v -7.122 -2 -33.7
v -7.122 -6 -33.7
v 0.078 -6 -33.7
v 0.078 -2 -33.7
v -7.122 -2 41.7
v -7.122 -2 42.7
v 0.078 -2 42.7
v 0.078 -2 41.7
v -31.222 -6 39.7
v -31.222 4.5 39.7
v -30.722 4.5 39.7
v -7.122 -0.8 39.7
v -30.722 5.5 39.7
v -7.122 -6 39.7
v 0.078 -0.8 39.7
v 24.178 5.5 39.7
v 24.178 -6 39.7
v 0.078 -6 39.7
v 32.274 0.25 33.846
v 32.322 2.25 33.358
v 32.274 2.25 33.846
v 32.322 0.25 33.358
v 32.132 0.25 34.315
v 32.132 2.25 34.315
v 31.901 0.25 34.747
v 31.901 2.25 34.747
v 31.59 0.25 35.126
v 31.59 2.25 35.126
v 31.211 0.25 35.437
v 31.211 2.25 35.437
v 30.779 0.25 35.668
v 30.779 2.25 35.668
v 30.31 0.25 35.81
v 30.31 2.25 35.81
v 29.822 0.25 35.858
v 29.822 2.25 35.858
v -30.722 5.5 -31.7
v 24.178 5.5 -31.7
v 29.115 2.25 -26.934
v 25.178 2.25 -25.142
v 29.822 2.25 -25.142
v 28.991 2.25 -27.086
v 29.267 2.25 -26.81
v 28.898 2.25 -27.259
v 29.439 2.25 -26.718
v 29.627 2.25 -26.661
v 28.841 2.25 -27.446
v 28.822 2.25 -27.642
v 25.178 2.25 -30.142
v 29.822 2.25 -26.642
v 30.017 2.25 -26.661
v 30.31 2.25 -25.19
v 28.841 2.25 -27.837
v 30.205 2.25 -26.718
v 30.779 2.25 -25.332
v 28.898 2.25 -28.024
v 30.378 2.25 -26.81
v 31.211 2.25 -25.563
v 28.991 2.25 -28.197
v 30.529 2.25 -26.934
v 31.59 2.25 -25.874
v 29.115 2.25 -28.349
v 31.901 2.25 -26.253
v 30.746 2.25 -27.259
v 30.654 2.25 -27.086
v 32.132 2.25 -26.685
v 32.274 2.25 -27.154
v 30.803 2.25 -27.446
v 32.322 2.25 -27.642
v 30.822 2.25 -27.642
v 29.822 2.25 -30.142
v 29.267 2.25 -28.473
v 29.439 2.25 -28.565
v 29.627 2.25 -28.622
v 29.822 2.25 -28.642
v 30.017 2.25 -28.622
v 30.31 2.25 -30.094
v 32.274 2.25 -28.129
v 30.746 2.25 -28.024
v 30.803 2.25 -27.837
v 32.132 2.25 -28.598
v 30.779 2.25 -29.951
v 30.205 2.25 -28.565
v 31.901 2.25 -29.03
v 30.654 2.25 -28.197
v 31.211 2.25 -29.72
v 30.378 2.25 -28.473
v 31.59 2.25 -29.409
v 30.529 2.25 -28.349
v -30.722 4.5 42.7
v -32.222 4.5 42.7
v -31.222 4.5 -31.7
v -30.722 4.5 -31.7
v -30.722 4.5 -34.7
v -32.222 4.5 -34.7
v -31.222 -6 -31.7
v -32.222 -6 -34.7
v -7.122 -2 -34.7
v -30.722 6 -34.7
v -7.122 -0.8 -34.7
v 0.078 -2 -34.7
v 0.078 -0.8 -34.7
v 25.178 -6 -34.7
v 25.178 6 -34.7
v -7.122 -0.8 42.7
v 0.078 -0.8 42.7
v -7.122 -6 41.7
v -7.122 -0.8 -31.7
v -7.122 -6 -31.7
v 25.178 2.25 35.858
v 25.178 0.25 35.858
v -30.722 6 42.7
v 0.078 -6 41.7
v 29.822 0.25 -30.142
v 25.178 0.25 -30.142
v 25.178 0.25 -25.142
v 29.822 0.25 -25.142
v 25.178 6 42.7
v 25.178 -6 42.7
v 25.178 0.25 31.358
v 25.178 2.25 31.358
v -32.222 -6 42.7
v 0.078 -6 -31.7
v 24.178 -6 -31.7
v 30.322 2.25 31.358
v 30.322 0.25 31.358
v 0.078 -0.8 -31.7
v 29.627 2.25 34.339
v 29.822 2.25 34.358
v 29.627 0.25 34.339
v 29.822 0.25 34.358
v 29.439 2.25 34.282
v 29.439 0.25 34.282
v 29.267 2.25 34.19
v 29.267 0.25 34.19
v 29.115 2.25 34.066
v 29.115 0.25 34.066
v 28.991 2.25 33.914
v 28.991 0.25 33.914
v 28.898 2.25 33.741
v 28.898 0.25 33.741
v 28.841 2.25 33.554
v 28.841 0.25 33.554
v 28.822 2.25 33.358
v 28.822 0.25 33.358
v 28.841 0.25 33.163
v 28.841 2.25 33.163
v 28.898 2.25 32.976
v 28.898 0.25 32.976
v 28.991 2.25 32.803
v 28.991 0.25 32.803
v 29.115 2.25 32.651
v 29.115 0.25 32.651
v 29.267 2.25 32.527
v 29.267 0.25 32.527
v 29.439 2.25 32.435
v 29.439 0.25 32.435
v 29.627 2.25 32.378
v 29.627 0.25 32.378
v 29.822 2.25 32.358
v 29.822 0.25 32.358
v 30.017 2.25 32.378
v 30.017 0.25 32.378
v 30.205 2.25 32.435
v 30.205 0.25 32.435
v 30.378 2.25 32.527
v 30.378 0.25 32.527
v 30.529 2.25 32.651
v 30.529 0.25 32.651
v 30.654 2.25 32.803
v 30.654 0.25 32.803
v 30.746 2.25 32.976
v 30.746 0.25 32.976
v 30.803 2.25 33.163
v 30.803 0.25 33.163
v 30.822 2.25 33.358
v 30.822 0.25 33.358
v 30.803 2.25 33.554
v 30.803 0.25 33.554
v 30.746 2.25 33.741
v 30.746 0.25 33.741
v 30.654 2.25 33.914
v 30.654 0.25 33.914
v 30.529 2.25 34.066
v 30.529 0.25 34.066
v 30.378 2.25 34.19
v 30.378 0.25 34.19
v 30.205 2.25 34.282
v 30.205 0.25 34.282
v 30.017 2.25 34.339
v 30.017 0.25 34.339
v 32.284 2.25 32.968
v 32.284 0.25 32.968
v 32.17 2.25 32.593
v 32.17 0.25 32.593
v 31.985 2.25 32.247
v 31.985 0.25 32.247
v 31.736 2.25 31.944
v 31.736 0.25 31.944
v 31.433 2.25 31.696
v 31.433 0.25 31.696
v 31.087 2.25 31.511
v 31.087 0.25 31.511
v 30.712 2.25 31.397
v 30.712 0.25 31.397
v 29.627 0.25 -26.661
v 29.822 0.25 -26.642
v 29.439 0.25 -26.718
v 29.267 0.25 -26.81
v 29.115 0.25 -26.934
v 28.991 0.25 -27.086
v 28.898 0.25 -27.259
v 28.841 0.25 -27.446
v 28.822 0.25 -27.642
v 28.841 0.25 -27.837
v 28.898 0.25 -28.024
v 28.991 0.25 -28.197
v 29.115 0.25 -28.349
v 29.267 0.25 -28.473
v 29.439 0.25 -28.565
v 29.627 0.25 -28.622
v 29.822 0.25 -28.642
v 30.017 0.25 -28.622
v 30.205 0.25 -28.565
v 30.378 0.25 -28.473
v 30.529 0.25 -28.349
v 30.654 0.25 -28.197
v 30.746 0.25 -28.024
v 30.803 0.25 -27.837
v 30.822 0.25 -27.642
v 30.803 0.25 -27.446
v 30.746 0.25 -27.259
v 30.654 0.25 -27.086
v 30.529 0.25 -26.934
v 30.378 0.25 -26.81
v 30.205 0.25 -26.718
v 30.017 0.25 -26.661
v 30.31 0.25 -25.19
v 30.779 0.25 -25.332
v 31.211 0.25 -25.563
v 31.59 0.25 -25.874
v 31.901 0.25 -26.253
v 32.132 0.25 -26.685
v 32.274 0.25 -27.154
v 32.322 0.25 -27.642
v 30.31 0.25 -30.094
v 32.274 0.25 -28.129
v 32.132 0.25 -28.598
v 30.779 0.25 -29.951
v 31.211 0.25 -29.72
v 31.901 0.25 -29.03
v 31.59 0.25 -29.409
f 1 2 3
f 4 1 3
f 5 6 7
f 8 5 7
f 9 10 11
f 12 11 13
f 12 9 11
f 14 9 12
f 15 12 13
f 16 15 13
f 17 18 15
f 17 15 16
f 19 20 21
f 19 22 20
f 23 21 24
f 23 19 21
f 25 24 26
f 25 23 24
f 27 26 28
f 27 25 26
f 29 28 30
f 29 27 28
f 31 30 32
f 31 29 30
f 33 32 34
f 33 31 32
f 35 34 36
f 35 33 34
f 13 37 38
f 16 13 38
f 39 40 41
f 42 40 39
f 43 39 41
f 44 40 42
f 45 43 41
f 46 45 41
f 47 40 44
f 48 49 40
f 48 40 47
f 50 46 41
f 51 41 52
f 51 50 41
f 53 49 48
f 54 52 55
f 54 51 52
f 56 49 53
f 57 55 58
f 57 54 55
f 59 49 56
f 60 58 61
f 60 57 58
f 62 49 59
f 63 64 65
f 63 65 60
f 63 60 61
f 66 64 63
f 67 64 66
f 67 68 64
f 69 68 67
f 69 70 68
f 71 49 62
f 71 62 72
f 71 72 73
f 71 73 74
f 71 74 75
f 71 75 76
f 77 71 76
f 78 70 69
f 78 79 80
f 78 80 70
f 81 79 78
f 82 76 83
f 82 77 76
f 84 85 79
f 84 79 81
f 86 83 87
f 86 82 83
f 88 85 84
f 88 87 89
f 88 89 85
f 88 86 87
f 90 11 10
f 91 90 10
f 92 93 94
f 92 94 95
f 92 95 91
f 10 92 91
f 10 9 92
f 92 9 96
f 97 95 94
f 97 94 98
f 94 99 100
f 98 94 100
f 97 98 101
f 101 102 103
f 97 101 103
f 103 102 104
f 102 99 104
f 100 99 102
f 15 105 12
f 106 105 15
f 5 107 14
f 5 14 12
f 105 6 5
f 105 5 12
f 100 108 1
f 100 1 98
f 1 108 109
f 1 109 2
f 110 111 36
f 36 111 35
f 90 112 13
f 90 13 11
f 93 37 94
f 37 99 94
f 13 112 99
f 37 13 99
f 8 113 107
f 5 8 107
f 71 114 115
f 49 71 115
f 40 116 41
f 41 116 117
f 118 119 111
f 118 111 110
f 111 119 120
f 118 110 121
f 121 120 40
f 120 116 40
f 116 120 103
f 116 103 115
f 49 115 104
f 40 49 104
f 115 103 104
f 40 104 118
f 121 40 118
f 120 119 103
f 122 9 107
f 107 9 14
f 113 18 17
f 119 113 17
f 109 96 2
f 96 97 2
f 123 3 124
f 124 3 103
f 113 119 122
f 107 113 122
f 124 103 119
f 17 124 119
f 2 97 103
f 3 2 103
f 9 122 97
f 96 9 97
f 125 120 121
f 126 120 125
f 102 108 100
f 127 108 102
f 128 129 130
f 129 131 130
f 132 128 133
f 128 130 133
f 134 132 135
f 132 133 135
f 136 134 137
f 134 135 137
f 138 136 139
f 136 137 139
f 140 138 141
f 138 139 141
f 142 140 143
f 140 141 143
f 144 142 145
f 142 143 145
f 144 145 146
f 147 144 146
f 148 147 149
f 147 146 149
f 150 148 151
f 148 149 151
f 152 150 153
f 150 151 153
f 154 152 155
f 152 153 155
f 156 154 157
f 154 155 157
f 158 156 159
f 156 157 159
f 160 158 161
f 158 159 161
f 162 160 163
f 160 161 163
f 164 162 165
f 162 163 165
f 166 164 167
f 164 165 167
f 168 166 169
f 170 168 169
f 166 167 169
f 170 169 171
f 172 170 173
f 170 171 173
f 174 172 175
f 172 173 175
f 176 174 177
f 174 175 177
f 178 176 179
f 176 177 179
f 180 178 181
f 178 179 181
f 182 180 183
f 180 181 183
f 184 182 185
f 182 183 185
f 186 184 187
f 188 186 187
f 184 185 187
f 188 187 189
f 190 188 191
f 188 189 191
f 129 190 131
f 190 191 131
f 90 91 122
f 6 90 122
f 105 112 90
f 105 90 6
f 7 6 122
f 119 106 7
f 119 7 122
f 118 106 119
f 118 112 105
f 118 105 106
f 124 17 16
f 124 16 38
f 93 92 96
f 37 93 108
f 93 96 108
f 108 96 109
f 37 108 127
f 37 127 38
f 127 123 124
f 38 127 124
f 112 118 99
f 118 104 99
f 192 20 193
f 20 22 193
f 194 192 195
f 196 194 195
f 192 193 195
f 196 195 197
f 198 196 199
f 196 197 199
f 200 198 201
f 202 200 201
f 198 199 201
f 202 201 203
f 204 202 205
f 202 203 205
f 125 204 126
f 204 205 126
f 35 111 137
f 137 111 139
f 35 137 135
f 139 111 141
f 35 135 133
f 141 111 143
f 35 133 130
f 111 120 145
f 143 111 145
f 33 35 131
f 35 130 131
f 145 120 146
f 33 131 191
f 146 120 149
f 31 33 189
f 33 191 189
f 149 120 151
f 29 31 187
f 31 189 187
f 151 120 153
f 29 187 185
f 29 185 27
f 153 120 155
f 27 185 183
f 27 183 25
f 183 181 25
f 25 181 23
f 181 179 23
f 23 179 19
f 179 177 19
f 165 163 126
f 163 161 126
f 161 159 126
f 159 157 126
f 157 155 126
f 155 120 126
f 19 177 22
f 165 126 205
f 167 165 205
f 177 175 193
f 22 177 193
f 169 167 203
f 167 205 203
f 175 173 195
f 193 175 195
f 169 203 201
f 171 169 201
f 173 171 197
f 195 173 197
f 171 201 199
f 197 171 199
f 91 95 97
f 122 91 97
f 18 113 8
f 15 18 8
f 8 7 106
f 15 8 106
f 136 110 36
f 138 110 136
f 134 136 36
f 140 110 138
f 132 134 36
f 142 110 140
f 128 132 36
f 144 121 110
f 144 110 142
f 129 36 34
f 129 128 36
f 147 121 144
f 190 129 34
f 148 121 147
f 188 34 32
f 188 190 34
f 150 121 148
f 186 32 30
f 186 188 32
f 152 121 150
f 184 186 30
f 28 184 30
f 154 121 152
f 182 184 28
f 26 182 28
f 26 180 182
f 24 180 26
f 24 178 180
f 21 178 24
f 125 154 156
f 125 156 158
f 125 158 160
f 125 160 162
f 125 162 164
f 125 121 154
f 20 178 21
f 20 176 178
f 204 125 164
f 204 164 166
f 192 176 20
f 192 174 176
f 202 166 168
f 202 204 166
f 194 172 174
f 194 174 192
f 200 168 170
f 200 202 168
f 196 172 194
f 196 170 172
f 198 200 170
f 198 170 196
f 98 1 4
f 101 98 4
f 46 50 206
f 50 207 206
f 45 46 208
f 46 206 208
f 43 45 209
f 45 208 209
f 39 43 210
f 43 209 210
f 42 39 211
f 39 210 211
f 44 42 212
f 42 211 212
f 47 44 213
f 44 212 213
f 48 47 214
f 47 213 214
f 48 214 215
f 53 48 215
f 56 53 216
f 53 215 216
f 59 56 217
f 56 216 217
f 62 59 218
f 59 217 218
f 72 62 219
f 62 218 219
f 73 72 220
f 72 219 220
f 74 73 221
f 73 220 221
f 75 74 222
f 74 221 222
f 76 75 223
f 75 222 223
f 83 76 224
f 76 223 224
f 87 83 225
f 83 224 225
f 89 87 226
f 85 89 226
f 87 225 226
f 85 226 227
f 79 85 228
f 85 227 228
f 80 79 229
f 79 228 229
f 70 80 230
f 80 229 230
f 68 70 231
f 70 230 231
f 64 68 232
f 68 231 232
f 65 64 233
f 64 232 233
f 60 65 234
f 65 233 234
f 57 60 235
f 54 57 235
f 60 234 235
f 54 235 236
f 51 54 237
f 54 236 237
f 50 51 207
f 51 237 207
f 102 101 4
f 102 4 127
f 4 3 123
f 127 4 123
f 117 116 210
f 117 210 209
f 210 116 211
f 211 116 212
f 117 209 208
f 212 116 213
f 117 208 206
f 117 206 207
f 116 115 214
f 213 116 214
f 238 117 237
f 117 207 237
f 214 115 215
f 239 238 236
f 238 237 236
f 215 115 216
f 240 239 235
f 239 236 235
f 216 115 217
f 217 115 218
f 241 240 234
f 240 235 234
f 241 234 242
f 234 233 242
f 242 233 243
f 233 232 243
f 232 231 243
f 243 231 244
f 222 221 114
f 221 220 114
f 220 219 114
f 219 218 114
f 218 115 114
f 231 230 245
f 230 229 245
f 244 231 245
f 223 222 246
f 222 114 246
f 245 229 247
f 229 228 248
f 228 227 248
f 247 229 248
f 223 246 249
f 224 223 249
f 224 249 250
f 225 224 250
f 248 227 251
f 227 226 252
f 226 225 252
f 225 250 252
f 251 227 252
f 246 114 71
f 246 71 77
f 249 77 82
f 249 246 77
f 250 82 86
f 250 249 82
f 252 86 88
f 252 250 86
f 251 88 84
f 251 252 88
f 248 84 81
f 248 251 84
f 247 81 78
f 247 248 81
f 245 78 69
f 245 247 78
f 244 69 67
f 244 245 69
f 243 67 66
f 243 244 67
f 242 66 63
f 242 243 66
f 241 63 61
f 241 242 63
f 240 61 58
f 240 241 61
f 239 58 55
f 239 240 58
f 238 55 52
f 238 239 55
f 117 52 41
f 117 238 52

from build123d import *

# Parameters (mm, degrees)
SKETCH1_R                = 1
SKETCH1_W                = 55.4
SKETCH1_H                = 71.4
BOSS_EXTRUDE1_DEPTH      = 5
SKETCH2_W                = 55.4
SKETCH2_H                = 71.4
BOSS_EXTRUDE2_DEPTH      = 1.5
SKETCH4_W                = 7.703515063
SKETCH4_H                = 8.608986158
CUT_EXTRUDE1_DEPTH       = 105.5
MOVE_FACE1_BY            = 7
MOVE_FACE2_BY            = 7.5
MOVE_FACE3_BY            = 4
MOVE_FACE3_2_BY          = 4
MOVE_FACE4_BY            = 4
MOVE_FACE4_2_BY          = 4
MOVE_FACE5_BY            = 0.4
MOVE_FACE5_2_BY          = 0.4
MOVE_FACE6_BY            = 0.4
MOVE_FACE6_2_BY          = 0.4
MOVE_START               = 3
MOVE_FACE7_OUTLINE_W     = 58.4
MOVE_FACE7_OUTLINE_H     = 74.4
MOVE_FACE7_OUTLINE_W_2   = 55.4
MOVE_FACE7_OUTLINE_H_2   = 71.4
MOVE_FACE7_DEPTH         = 2
MOVE_START_2             = -25.141552832
MOVE_FACE8_OUTLINE_W     = 0.5
MOVE_FACE8_OUTLINE_H     = 10
MOVE_FACE8_DEPTH         = 56
MOVE_START_3             = -33.2
MOVE_FACE8_2_OUTLINE_W   = 58.4
MOVE_FACE8_2_OUTLINE_H   = 10
MOVE_FACE8_2_DEPTH       = 0.5
MOVE_START_4             = 40.7
MOVE_FACE8_3_OUTLINE_W   = 58.4
MOVE_FACE8_3_OUTLINE_H   = 10
MOVE_FACE8_3_DEPTH       = 0.5
MOVE_START_5             = -32.7
MOVE_FACE8_4_OUTLINE_W   = 0.5
MOVE_FACE8_4_OUTLINE_H   = 10
MOVE_FACE8_4_OUTLINE_H_2 = 1
MOVE_FACE8_4_DEPTH       = 73.4
MOVE_START_6             = 35.858447168
MOVE_FACE8_5_OUTLINE_W   = 0.5
MOVE_FACE8_5_OUTLINE_H   = 9
MOVE_FACE8_5_DEPTH       = 4.841552832
MOVE_FACE8_6_OUTLINE_W   = 0.5
MOVE_FACE8_6_OUTLINE_H   = 9
MOVE_FACE8_6_DEPTH       = 2.558447168
CUT_EXTRUDE2_DEPTH       = 66
CUT_EXTRUDE2_DEPTH_BACK  = 64
SKETCH5_W                = 9.341764375
SKETCH5_H                = 8.237393027
CUT_EXTRUDE3_DEPTH       = 4
FILLET3_R                = 2
MOVE_FACE9_OUTLINE_W     = 57.4
MOVE_FACE9_OUTLINE_H     = 73.4
MOVE_FACE9_OUTLINE_W_2   = 55.4
MOVE_FACE9_OUTLINE_H_2   = 71.4
MOVE_FACE9_DEPTH         = 2.5
SKETCH7_W                = 57.4
SKETCH7_H                = 73.4
BOSS_EXTRUDE3_DEPTH      = 0.5
SKETCH8_W                = 57.4
SKETCH8_H                = 73.4
CUT_EXTRUDE4_DEPTH       = 1
MOVE_FACE10_BY           = 0.25
MOVE_FACE10_2_BY         = 0.25
MOVE_FACE11_BY           = 0.25
MOVE_FACE11_2_BY         = 0.25
SKETCH9_W                = 1.5
SKETCH9_H                = 73.4
CUT_EXTRUDE5_DEPTH       = 1.5
MOVE_START_7             = -34.7
MOVE_FACE12_DEPTH        = 2
MOVE_FACE12_2_DEPTH      = 2
CUT_EXTRUDE6_DEPTH       = 5.2
SKETCH12_W               = 7.2
SKETCH12_H               = 1.2
CUT_EXTRUDE7_DEPTH       = 108.2


# Read off the part's stored shape, not the designer's step: Move Face7, Move Face8, Move Face9, Move Face12
with BuildPart() as part:
    # Sketch1 → Boss-Extrude1 (new body)
    with BuildSketch(Plane(origin=(0, 0, 0), x_dir=(1, 0, 0), z_dir=(0, 1, 0))):
        with BuildLine():
            Line((26.077909727, -37.2), (26.077909727, -35.858447168))
            Line((26.077909727, -35.858447168), (29.822090273, -35.858447168))
            ThreePointArc((29.822090273, -35.858447168), (32.322090273, -33.358447168), (29.822090273, -30.858447168))
            Line((29.822090273, -30.858447168), (26.077909727, -30.858447168))
            Line((26.077909727, -30.858447168), (26.077909727, 25.141552832))
            Line((26.077909727, 25.141552832), (29.822090273, 25.141552832))
            ThreePointArc((29.822090273, 25.141552832), (32.322090273, 27.641552832), (29.822090273, 30.141552832))
            Line((29.822090273, 30.141552832), (26.077909727, 30.141552832))
            Line((26.077909727, 30.141552832), (26.077909727, 37.2))
            Line((26.077909727, 37.2), (-32.322090273, 37.2))
            Line((-32.322090273, 37.2), (-32.322090273, -37.2))
            Line((-32.322090273, -37.2), (26.077909727, -37.2))
        make_face()
        with Locations(Location((29.822090273, 27.641552832, 0), (0, 0, 270))):
            Circle(SKETCH1_R, mode=Mode.SUBTRACT)
        with Locations(Location((29.822090273, -33.358447168, 0), (0, 0, 270))):
            Circle(SKETCH1_R, mode=Mode.SUBTRACT)
        with Locations((-3.122090273, 0)):
            Rectangle(SKETCH1_W, SKETCH1_H, mode=Mode.SUBTRACT)
    extrude(amount=BOSS_EXTRUDE1_DEPTH)

    # Sketch2 → Boss-Extrude2 (add)
    with BuildSketch(Plane(origin=(0, 0, 0), x_dir=(1, 0, 0), z_dir=(0, 1, 0))):
        with Locations((-3.122090273, 0)):
            Rectangle(SKETCH2_W, SKETCH2_H)
    extrude(amount=BOSS_EXTRUDE2_DEPTH)

    # Sketch4 → Cut-Extrude1 (cut)
    with BuildSketch(Plane.XY.offset(35.858447168)):
        with Locations((29.929667259, 6.304493079)):
            Rectangle(SKETCH4_W, SKETCH4_H)
    extrude(amount=-CUT_EXTRUDE1_DEPTH, mode=Mode.SUBTRACT)

    # Move Face1: a face moved outward by 7.0
    extrude(part.faces().sort_by_distance((-2.752621979, 0, 0.033029774))[0], amount=MOVE_FACE1_BY, dir=(0, -1, 0))

    # Move Face2: a face moved inward by 7.5
    extrude(part.faces().sort_by_distance((-3.122090273, 1.5, 0))[0], amount=MOVE_FACE2_BY, dir=(0, -1, 0), mode=Mode.SUBTRACT)

    # Move Face3: a face moved outward by 4.0
    extrude(part.faces().sort_by_distance((-3.122090273, -1, 37.2))[0], amount=MOVE_FACE3_BY, dir=(0, 0, 1))

    # Move Face3 2: a face moved outward by 4.0
    extrude(part.faces().sort_by_distance((-3.122090273, -0.5, -35.7))[0], amount=MOVE_FACE3_2_BY, dir=(0, 0, 1))

    # Move Face4: a face moved inward by 4.0
    extrude(part.faces().sort_by_distance((-3.122090273, -0.5, 35.7))[0], amount=MOVE_FACE4_BY, dir=(0, 0, 1), mode=Mode.SUBTRACT)

    # Move Face4 2: a face moved inward by 4.0
    extrude(part.faces().sort_by_distance((-3.122090273, -1, -37.2))[0], amount=MOVE_FACE4_2_BY, dir=(0, 0, 1), mode=Mode.SUBTRACT)

    # Move Face5: a face moved outward by 0.4
    extrude(part.faces().sort_by_distance((24.577909727, -0.5, 4))[0], amount=MOVE_FACE5_BY, dir=(-1, 0, 0))

    # Move Face5 2: a face moved outward by 0.4
    extrude(part.faces().sort_by_distance((-32.322090273, -1, 4))[0], amount=MOVE_FACE5_2_BY, dir=(-1, 0, 0))

    # Move Face6: a face moved inward by 0.4
    extrude(part.faces().sort_by_distance((-30.822090273, -0.5, 4))[0], amount=MOVE_FACE6_BY, dir=(-1, 0, 0), mode=Mode.SUBTRACT)

    # Move Face6 2: a face moved inward by 0.4
    extrude(part.faces().sort_by_distance((26.077909727, -0.831838565, 4.127976775))[0], amount=MOVE_FACE6_2_BY, dir=(-1, 0, 0), mode=Mode.SUBTRACT)

    # Move Face7 outline → Move Face7 (cut)
    with BuildSketch(Plane(origin=(0, 0, 0), x_dir=(1, 0, 0), z_dir=(0, 1, 0)).offset(MOVE_START)):
        with Locations((-3.522090273, -4)):
            Rectangle(MOVE_FACE7_OUTLINE_W, MOVE_FACE7_OUTLINE_H)
        with Locations((-3.522090273, -4)):
            Rectangle(MOVE_FACE7_OUTLINE_W_2, MOVE_FACE7_OUTLINE_H_2, mode=Mode.SUBTRACT)
    extrude(amount=MOVE_FACE7_DEPTH, mode=Mode.SUBTRACT)

    # Move Face8 outline → Move Face8 (cut)
    with BuildSketch(Plane.XY.offset(MOVE_START_2)):
        with Locations((-32.472090273, -2)):
            Rectangle(MOVE_FACE8_OUTLINE_W, MOVE_FACE8_OUTLINE_H)
        with Locations((25.427909727, -2)):
            Rectangle(MOVE_FACE8_OUTLINE_W, MOVE_FACE8_OUTLINE_H)
    extrude(amount=MOVE_FACE8_DEPTH, mode=Mode.SUBTRACT)

    # Move Face8 2 outline → Move Face8 2 (cut)
    with BuildSketch(Plane.XY.offset(MOVE_START_3)):
        with Locations((-3.522090273, -2)):
            Rectangle(MOVE_FACE8_2_OUTLINE_W, MOVE_FACE8_2_OUTLINE_H)
    extrude(amount=MOVE_FACE8_2_DEPTH, mode=Mode.SUBTRACT)

    # Move Face8 3 outline → Move Face8 3 (cut)
    with BuildSketch(Plane.XY.offset(MOVE_START_4)):
        with Locations((-3.522090273, -2)):
            Rectangle(MOVE_FACE8_3_OUTLINE_W, MOVE_FACE8_3_OUTLINE_H)
    extrude(amount=MOVE_FACE8_3_DEPTH, mode=Mode.SUBTRACT)

    # Move Face8 4 outline → Move Face8 4 (cut)
    with BuildSketch(Plane.XY.offset(MOVE_START_5)):
        with Locations((-32.472090273, -2)):
            Rectangle(MOVE_FACE8_4_OUTLINE_W, MOVE_FACE8_4_OUTLINE_H)
        with Locations((25.427909727, 2.5)):
            Rectangle(MOVE_FACE8_4_OUTLINE_W, MOVE_FACE8_4_OUTLINE_H_2)
    extrude(amount=MOVE_FACE8_4_DEPTH, mode=Mode.SUBTRACT)

    # Move Face8 5 outline → Move Face8 5 (cut)
    with BuildSketch(Plane.XY.offset(MOVE_START_6)):
        with Locations((25.427909727, -2.5)):
            Rectangle(MOVE_FACE8_5_OUTLINE_W, MOVE_FACE8_5_OUTLINE_H)
    extrude(amount=MOVE_FACE8_5_DEPTH, mode=Mode.SUBTRACT)

    # Move Face8 6 outline → Move Face8 6 (cut)
    with BuildSketch(Plane.XY.offset(MOVE_START_5)):
        with Locations((25.427909727, -2.5)):
            Rectangle(MOVE_FACE8_6_OUTLINE_W, MOVE_FACE8_6_OUTLINE_H)
    extrude(amount=MOVE_FACE8_6_DEPTH, mode=Mode.SUBTRACT)

    # Sketch5 → Cut-Extrude2 (cut, two sides: drawn at the far end of the back side and taken through both)
    with BuildSketch(Plane.XY.offset(-CUT_EXTRUDE2_DEPTH_BACK)):
        with Locations((29.848791915, -4.118696514)):
            Rectangle(SKETCH5_W, SKETCH5_H)
    extrude(amount=CUT_EXTRUDE2_DEPTH + CUT_EXTRUDE2_DEPTH_BACK, mode=Mode.SUBTRACT)

    # Sketch6 → Cut-Extrude3 (cut)
    with BuildSketch(Plane(origin=(0, 2, 0), x_dir=(1, 0, 0), z_dir=(0, 1, 0))):
        Polygon((25.177909727, -30.858447168), (25.177909727, -31.358447168), (32.688438313, -31.358447168), (32.688438313, -30.19770306), (25.177909727, -30.19770306), align=None)
    extrude(amount=-CUT_EXTRUDE3_DEPTH, mode=Mode.SUBTRACT)

    # Fillet3
    fillet3_edges = [part.edges().sort_by_distance(p)[0] for p in [
        (31.322090273, 1, 31.358447168),
    ]]
    fillet(fillet3_edges, radius=FILLET3_R)

    # Move Face9 outline → Move Face9 (add)
    with BuildSketch(Plane(origin=(0, 0, 0), x_dir=(1, 0, 0), z_dir=(0, 1, 0)).offset(MOVE_START)):
        with Locations((-3.522090273, -4)):
            Rectangle(MOVE_FACE9_OUTLINE_W, MOVE_FACE9_OUTLINE_H)
        with Locations((-3.522090273, -4)):
            Rectangle(MOVE_FACE9_OUTLINE_W_2, MOVE_FACE9_OUTLINE_H_2, mode=Mode.SUBTRACT)
    extrude(amount=MOVE_FACE9_DEPTH)

    # Sketch7 → Boss-Extrude3 (add)
    with BuildSketch(Plane(origin=(0, 5.5, 0), x_dir=(1, 0, 0), z_dir=(0, 1, 0))):
        with Locations((-3.522090273, -4)):
            Rectangle(SKETCH7_W, SKETCH7_H)
    extrude(amount=BOSS_EXTRUDE3_DEPTH)

    # Sketch8 → Cut-Extrude4 (cut)
    with BuildSketch(Plane.XZ.offset(7)):
        with Locations((-3.522090273, 4)):
            Rectangle(SKETCH8_W, SKETCH8_H)
    extrude(amount=-CUT_EXTRUDE4_DEPTH, mode=Mode.SUBTRACT)

    # Move Face10: a face moved inward by 0.25
    extrude(part.faces().sort_by_distance((28.366938403, 0, -27.641552832))[0], amount=MOVE_FACE10_BY, dir=(0, 1, 0), mode=Mode.SUBTRACT)

    # Move Face10 2: a face moved inward by 0.25
    extrude(part.faces().sort_by_distance((28.373500925, 0, 33.610852536))[0], amount=MOVE_FACE10_2_BY, dir=(0, 1, 0), mode=Mode.SUBTRACT)

    # Move Face11: a face moved outward by 0.25
    extrude(part.faces().sort_by_distance((28.373500925, 2, 33.610852536))[0], amount=MOVE_FACE11_BY, dir=(0, 1, 0))

    # Move Face11 2: a face moved outward by 0.25
    extrude(part.faces().sort_by_distance((28.366938403, 2, -27.641552832))[0], amount=MOVE_FACE11_2_BY, dir=(0, 1, 0))

    # Sketch9 → Cut-Extrude5 (cut)
    with BuildSketch(Plane(origin=(0, 6, 0), x_dir=(1, 0, 0), z_dir=(0, 1, 0))):
        with Locations((-31.472090273, -4)):
            Rectangle(SKETCH9_W, SKETCH9_H)
    extrude(amount=-CUT_EXTRUDE5_DEPTH, mode=Mode.SUBTRACT)

    # Move Face12 outline → Move Face12 (add)
    with BuildSketch(Plane.XY.offset(MOVE_START_7)):
        Polygon((-32.222090273, 4.5), (-32.222090273, -6), (25.177909727, -6), (25.177909727, 6), (-30.722090273, 6), (-30.722090273, 4.5), align=None)
    extrude(amount=MOVE_FACE12_DEPTH)

    # Move Face12 2 outline → Move Face12 2 (add)
    with BuildSketch(Plane.XY.offset(MOVE_START_4)):
        Polygon((-32.222090273, 4.5), (-32.222090273, -6), (25.177909727, -6), (25.177909727, 6), (-30.722090273, 6), (-30.722090273, 4.5), align=None)
    extrude(amount=MOVE_FACE12_2_DEPTH)

    # Sketch10 → Cut-Extrude6 (cut)
    with BuildSketch(Plane.XZ.offset(6)):
        Polygon((-3.522090273, 41.7), (0.077909727, 41.7), (0.077909727, 38.920271818), (-7.122090273, 38.920271818), (-7.122090273, 41.7), align=None)
        Polygon((-7.122090273, -33.7), (-3.522090273, -33.7), (0.077909727, -33.7), (0.077909727, -30.920271818), (-7.122090273, -30.920271818), align=None)
    extrude(amount=-CUT_EXTRUDE6_DEPTH, mode=Mode.SUBTRACT)

    # Sketch12 → Cut-Extrude7 (cut)
    with BuildSketch(Plane.XY.offset(42.7)):
        with Locations((-3.522090273, -1.4)):
            Rectangle(SKETCH12_W, SKETCH12_H)
    extrude(amount=-CUT_EXTRUDE7_DEPTH, mode=Mode.SUBTRACT)


solid = part.part
